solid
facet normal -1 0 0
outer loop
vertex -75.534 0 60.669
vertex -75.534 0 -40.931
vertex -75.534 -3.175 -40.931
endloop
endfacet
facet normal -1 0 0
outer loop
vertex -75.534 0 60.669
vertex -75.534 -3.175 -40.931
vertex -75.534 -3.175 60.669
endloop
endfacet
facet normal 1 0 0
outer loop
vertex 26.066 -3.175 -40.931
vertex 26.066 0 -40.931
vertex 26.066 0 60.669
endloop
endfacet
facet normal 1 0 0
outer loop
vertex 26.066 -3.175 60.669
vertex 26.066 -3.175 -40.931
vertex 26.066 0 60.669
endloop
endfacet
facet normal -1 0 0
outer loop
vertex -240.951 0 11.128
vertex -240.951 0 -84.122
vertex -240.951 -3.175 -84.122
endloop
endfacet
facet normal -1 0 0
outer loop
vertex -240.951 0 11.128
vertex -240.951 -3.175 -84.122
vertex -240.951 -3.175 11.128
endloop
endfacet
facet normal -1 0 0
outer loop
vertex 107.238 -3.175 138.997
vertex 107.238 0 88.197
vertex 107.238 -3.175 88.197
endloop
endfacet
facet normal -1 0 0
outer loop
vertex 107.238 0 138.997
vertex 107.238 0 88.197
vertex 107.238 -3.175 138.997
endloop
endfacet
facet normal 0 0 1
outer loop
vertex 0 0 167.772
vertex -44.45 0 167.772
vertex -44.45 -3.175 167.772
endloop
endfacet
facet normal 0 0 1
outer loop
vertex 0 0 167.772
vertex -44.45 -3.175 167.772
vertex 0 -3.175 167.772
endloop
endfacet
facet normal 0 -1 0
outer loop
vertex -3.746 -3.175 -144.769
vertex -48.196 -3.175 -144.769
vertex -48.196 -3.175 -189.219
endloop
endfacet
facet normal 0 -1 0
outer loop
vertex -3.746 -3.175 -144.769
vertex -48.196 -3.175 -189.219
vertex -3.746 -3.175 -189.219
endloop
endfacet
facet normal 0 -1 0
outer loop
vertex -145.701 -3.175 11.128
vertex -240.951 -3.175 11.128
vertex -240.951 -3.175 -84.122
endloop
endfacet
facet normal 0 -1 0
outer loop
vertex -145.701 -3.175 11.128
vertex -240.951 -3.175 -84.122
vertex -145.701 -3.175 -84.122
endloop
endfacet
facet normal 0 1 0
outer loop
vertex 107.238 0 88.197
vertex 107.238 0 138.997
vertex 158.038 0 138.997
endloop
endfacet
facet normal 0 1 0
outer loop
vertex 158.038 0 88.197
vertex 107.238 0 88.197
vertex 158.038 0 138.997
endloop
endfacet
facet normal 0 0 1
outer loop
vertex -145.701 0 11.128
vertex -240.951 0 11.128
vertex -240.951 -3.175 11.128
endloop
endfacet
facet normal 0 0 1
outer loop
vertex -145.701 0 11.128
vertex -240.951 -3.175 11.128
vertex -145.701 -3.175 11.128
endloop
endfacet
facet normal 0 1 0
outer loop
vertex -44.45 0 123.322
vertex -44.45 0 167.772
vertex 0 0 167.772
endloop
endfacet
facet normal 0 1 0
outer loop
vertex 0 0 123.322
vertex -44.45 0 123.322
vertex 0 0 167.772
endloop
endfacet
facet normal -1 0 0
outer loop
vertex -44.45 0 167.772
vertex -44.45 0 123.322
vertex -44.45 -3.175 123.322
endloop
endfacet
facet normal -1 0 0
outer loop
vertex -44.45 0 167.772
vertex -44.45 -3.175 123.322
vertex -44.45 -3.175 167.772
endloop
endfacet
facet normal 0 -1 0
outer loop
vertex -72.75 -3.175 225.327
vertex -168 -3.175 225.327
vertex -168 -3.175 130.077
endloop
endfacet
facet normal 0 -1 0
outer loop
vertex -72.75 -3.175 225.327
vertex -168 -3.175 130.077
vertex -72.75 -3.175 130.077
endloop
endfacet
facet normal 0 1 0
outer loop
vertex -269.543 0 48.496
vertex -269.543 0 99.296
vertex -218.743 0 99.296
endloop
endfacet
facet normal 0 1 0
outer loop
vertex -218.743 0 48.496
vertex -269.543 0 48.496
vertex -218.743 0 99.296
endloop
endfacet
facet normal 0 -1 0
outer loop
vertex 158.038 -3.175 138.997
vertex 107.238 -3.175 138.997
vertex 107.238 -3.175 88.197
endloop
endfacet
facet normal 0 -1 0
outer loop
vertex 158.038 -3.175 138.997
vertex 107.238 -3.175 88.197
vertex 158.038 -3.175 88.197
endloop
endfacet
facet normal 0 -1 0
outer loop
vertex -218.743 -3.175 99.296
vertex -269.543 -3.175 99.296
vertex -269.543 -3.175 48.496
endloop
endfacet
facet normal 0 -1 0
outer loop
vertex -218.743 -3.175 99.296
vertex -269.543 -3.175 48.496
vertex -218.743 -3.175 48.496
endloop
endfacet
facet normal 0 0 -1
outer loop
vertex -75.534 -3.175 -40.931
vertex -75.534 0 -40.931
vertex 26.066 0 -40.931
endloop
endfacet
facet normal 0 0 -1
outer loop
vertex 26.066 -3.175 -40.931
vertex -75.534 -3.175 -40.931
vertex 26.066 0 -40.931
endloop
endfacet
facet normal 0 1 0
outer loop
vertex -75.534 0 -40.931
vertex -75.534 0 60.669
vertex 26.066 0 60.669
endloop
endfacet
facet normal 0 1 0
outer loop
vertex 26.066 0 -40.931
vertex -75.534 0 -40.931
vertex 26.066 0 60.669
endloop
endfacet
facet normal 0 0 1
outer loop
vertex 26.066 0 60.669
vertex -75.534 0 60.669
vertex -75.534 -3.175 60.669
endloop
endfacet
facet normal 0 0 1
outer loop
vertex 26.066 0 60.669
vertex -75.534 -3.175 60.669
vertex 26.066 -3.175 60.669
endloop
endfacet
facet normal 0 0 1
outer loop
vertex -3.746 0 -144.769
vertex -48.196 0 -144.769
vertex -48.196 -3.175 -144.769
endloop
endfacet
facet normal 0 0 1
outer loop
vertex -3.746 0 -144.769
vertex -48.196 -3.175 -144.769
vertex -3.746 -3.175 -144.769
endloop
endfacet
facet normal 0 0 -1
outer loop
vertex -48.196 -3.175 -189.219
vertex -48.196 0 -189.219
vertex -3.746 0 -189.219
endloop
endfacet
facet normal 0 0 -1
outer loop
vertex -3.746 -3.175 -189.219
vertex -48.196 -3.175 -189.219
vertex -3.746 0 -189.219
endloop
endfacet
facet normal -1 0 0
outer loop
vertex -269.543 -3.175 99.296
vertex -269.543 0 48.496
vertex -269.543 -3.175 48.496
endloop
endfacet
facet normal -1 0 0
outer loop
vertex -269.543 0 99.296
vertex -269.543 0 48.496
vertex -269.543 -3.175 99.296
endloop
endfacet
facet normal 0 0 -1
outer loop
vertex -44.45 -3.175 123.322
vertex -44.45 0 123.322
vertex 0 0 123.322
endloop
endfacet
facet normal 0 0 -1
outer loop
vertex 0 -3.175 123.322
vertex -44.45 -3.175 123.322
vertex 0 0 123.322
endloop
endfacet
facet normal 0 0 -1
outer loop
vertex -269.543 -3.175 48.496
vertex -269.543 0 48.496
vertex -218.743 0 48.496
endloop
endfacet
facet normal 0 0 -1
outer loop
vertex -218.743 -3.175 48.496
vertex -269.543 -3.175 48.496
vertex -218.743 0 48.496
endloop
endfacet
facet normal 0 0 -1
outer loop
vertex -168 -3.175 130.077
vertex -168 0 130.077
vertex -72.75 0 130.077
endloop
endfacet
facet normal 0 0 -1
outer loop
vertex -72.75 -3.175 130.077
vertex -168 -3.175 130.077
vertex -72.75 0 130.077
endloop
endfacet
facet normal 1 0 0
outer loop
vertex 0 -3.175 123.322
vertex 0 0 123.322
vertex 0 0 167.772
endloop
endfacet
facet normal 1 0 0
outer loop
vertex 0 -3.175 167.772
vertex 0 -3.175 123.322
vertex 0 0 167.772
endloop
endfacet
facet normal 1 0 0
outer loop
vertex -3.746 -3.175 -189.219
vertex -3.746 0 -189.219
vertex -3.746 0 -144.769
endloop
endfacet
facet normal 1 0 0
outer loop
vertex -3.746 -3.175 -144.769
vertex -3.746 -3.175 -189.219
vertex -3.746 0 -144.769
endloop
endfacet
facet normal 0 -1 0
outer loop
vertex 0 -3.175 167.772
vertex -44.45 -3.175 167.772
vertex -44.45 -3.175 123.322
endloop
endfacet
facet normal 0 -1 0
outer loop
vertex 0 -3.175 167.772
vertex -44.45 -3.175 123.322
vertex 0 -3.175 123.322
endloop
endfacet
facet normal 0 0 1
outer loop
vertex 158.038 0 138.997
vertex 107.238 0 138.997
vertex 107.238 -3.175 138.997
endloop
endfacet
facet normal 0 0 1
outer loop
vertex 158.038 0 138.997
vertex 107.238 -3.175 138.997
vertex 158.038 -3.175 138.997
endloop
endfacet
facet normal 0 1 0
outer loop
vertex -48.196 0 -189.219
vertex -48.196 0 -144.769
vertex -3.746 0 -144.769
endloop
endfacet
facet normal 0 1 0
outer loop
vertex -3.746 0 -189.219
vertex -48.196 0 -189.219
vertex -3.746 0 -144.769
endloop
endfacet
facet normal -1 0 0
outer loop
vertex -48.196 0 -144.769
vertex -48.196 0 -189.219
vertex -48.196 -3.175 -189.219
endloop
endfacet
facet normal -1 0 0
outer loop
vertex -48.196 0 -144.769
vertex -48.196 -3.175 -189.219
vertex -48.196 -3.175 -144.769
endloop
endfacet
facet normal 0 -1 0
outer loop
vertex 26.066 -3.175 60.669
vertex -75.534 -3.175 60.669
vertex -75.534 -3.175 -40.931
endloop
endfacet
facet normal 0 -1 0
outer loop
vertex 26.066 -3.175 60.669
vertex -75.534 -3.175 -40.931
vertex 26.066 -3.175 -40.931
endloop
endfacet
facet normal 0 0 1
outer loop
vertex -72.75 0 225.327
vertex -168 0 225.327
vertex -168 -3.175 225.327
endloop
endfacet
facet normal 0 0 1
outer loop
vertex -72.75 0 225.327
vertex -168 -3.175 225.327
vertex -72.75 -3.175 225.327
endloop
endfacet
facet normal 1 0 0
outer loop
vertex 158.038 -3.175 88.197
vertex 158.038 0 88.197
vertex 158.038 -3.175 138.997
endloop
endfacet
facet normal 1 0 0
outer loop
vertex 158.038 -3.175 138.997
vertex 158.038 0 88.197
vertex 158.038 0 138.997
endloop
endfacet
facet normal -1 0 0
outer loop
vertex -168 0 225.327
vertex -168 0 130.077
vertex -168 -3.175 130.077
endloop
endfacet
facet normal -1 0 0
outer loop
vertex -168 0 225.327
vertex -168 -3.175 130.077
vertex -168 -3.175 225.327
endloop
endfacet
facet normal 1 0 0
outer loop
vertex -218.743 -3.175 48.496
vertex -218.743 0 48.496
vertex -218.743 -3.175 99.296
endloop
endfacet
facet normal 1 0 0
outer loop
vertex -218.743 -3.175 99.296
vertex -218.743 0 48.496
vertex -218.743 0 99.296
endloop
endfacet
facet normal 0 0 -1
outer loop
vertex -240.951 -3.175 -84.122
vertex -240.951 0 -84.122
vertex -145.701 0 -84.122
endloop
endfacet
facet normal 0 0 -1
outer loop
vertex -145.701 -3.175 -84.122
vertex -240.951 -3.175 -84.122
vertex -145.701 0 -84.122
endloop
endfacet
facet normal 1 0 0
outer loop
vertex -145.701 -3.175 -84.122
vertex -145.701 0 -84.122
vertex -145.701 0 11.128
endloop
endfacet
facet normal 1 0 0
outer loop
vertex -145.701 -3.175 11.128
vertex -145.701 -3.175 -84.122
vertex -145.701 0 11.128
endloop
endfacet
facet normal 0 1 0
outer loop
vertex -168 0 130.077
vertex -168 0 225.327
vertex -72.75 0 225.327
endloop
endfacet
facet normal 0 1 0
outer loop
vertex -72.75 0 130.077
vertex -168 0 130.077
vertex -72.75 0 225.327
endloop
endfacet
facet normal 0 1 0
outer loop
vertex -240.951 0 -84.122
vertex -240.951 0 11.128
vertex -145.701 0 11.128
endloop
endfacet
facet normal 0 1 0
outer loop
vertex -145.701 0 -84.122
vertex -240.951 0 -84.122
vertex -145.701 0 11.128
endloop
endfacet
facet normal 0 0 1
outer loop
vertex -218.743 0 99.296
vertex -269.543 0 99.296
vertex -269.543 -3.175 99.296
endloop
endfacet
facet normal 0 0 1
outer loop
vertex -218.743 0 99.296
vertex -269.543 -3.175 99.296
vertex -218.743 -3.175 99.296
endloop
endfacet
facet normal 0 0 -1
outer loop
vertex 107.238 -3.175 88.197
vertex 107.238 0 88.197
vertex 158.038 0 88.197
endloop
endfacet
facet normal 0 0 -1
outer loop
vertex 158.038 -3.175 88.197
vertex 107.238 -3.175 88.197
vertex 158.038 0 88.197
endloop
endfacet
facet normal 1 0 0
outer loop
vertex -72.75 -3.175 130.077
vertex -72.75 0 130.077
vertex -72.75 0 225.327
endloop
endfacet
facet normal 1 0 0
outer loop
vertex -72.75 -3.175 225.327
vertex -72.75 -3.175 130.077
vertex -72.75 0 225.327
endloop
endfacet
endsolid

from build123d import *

# Parameters (mm, degrees)
F0_W     = 95.25
F0_H     = 95.25
F1_DEPTH = 3.175
F0_W_2   = 50.8
F0_H_2   = 50.8
F0_W_3   = 101.6
F0_H_3   = 101.6
F0_W_4   = 44.45
F0_H_4   = 44.45


# Not quite as in the source:
# - a length typed as a fraction of an inch, garbled in the dataset ("3 / 203.2 mm" for 3/8 in), is restored


with BuildPart() as f1:
    # F0 (on Front) → F1 (new body)
    with BuildSketch(Plane.XZ):
        with Locations((-193.3262549639, -36.4967786074)):
            Rectangle(F0_W, F0_H)
    extrude(amount=F1_DEPTH)


with BuildPart() as f1b:
    # F0 (on Front) → F1, piece 2 (new body)
    with BuildSketch(Plane.XZ):
        with Locations((-244.1432305336, 73.8963320196)):
            Rectangle(F0_W_2, F0_H_2)
    extrude(amount=F1_DEPTH)


with BuildPart() as f1c:
    # F0 (on Front) → F1, piece 3 (new body)
    with BuildSketch(Plane.XZ):
        with Locations((-24.7342750663, 9.8693149265)):
            Rectangle(F0_W_3, F0_H_3)
    extrude(amount=F1_DEPTH)


with BuildPart() as f1d:
    # F0 (on Front) → F1, piece 4 (new body)
    with BuildSketch(Plane.XZ):
        with Locations((-22.225, 145.5471367002)):
            Rectangle(F0_W_4, F0_H_4)
    extrude(amount=F1_DEPTH)


with BuildPart() as f1e:
    # F0 (on Front) → F1, piece 5 (new body)
    with BuildSketch(Plane.XZ):
        with Locations((-120.3747444153, 177.7017660141)):
            Rectangle(F0_W, F0_H)
    extrude(amount=F1_DEPTH)


with BuildPart() as f1f:
    # F0 (on Front) → F1, piece 6 (new body)
    with BuildSketch(Plane.XZ):
        with Locations((132.6381585836, 113.5968066096)):
            Rectangle(F0_W_2, F0_H_2)
    extrude(amount=F1_DEPTH)


with BuildPart() as f1g:
    # F0 (on Front) → F1, piece 7 (new body)
    with BuildSketch(Plane.XZ):
        with Locations((-25.9709171593, -166.9937446356)):
            Rectangle(F0_W_4, F0_H_4)
    extrude(amount=F1_DEPTH)


solid = Compound([f1.part, f1b.part, f1c.part, f1d.part, f1e.part, f1f.part, f1g.part])
